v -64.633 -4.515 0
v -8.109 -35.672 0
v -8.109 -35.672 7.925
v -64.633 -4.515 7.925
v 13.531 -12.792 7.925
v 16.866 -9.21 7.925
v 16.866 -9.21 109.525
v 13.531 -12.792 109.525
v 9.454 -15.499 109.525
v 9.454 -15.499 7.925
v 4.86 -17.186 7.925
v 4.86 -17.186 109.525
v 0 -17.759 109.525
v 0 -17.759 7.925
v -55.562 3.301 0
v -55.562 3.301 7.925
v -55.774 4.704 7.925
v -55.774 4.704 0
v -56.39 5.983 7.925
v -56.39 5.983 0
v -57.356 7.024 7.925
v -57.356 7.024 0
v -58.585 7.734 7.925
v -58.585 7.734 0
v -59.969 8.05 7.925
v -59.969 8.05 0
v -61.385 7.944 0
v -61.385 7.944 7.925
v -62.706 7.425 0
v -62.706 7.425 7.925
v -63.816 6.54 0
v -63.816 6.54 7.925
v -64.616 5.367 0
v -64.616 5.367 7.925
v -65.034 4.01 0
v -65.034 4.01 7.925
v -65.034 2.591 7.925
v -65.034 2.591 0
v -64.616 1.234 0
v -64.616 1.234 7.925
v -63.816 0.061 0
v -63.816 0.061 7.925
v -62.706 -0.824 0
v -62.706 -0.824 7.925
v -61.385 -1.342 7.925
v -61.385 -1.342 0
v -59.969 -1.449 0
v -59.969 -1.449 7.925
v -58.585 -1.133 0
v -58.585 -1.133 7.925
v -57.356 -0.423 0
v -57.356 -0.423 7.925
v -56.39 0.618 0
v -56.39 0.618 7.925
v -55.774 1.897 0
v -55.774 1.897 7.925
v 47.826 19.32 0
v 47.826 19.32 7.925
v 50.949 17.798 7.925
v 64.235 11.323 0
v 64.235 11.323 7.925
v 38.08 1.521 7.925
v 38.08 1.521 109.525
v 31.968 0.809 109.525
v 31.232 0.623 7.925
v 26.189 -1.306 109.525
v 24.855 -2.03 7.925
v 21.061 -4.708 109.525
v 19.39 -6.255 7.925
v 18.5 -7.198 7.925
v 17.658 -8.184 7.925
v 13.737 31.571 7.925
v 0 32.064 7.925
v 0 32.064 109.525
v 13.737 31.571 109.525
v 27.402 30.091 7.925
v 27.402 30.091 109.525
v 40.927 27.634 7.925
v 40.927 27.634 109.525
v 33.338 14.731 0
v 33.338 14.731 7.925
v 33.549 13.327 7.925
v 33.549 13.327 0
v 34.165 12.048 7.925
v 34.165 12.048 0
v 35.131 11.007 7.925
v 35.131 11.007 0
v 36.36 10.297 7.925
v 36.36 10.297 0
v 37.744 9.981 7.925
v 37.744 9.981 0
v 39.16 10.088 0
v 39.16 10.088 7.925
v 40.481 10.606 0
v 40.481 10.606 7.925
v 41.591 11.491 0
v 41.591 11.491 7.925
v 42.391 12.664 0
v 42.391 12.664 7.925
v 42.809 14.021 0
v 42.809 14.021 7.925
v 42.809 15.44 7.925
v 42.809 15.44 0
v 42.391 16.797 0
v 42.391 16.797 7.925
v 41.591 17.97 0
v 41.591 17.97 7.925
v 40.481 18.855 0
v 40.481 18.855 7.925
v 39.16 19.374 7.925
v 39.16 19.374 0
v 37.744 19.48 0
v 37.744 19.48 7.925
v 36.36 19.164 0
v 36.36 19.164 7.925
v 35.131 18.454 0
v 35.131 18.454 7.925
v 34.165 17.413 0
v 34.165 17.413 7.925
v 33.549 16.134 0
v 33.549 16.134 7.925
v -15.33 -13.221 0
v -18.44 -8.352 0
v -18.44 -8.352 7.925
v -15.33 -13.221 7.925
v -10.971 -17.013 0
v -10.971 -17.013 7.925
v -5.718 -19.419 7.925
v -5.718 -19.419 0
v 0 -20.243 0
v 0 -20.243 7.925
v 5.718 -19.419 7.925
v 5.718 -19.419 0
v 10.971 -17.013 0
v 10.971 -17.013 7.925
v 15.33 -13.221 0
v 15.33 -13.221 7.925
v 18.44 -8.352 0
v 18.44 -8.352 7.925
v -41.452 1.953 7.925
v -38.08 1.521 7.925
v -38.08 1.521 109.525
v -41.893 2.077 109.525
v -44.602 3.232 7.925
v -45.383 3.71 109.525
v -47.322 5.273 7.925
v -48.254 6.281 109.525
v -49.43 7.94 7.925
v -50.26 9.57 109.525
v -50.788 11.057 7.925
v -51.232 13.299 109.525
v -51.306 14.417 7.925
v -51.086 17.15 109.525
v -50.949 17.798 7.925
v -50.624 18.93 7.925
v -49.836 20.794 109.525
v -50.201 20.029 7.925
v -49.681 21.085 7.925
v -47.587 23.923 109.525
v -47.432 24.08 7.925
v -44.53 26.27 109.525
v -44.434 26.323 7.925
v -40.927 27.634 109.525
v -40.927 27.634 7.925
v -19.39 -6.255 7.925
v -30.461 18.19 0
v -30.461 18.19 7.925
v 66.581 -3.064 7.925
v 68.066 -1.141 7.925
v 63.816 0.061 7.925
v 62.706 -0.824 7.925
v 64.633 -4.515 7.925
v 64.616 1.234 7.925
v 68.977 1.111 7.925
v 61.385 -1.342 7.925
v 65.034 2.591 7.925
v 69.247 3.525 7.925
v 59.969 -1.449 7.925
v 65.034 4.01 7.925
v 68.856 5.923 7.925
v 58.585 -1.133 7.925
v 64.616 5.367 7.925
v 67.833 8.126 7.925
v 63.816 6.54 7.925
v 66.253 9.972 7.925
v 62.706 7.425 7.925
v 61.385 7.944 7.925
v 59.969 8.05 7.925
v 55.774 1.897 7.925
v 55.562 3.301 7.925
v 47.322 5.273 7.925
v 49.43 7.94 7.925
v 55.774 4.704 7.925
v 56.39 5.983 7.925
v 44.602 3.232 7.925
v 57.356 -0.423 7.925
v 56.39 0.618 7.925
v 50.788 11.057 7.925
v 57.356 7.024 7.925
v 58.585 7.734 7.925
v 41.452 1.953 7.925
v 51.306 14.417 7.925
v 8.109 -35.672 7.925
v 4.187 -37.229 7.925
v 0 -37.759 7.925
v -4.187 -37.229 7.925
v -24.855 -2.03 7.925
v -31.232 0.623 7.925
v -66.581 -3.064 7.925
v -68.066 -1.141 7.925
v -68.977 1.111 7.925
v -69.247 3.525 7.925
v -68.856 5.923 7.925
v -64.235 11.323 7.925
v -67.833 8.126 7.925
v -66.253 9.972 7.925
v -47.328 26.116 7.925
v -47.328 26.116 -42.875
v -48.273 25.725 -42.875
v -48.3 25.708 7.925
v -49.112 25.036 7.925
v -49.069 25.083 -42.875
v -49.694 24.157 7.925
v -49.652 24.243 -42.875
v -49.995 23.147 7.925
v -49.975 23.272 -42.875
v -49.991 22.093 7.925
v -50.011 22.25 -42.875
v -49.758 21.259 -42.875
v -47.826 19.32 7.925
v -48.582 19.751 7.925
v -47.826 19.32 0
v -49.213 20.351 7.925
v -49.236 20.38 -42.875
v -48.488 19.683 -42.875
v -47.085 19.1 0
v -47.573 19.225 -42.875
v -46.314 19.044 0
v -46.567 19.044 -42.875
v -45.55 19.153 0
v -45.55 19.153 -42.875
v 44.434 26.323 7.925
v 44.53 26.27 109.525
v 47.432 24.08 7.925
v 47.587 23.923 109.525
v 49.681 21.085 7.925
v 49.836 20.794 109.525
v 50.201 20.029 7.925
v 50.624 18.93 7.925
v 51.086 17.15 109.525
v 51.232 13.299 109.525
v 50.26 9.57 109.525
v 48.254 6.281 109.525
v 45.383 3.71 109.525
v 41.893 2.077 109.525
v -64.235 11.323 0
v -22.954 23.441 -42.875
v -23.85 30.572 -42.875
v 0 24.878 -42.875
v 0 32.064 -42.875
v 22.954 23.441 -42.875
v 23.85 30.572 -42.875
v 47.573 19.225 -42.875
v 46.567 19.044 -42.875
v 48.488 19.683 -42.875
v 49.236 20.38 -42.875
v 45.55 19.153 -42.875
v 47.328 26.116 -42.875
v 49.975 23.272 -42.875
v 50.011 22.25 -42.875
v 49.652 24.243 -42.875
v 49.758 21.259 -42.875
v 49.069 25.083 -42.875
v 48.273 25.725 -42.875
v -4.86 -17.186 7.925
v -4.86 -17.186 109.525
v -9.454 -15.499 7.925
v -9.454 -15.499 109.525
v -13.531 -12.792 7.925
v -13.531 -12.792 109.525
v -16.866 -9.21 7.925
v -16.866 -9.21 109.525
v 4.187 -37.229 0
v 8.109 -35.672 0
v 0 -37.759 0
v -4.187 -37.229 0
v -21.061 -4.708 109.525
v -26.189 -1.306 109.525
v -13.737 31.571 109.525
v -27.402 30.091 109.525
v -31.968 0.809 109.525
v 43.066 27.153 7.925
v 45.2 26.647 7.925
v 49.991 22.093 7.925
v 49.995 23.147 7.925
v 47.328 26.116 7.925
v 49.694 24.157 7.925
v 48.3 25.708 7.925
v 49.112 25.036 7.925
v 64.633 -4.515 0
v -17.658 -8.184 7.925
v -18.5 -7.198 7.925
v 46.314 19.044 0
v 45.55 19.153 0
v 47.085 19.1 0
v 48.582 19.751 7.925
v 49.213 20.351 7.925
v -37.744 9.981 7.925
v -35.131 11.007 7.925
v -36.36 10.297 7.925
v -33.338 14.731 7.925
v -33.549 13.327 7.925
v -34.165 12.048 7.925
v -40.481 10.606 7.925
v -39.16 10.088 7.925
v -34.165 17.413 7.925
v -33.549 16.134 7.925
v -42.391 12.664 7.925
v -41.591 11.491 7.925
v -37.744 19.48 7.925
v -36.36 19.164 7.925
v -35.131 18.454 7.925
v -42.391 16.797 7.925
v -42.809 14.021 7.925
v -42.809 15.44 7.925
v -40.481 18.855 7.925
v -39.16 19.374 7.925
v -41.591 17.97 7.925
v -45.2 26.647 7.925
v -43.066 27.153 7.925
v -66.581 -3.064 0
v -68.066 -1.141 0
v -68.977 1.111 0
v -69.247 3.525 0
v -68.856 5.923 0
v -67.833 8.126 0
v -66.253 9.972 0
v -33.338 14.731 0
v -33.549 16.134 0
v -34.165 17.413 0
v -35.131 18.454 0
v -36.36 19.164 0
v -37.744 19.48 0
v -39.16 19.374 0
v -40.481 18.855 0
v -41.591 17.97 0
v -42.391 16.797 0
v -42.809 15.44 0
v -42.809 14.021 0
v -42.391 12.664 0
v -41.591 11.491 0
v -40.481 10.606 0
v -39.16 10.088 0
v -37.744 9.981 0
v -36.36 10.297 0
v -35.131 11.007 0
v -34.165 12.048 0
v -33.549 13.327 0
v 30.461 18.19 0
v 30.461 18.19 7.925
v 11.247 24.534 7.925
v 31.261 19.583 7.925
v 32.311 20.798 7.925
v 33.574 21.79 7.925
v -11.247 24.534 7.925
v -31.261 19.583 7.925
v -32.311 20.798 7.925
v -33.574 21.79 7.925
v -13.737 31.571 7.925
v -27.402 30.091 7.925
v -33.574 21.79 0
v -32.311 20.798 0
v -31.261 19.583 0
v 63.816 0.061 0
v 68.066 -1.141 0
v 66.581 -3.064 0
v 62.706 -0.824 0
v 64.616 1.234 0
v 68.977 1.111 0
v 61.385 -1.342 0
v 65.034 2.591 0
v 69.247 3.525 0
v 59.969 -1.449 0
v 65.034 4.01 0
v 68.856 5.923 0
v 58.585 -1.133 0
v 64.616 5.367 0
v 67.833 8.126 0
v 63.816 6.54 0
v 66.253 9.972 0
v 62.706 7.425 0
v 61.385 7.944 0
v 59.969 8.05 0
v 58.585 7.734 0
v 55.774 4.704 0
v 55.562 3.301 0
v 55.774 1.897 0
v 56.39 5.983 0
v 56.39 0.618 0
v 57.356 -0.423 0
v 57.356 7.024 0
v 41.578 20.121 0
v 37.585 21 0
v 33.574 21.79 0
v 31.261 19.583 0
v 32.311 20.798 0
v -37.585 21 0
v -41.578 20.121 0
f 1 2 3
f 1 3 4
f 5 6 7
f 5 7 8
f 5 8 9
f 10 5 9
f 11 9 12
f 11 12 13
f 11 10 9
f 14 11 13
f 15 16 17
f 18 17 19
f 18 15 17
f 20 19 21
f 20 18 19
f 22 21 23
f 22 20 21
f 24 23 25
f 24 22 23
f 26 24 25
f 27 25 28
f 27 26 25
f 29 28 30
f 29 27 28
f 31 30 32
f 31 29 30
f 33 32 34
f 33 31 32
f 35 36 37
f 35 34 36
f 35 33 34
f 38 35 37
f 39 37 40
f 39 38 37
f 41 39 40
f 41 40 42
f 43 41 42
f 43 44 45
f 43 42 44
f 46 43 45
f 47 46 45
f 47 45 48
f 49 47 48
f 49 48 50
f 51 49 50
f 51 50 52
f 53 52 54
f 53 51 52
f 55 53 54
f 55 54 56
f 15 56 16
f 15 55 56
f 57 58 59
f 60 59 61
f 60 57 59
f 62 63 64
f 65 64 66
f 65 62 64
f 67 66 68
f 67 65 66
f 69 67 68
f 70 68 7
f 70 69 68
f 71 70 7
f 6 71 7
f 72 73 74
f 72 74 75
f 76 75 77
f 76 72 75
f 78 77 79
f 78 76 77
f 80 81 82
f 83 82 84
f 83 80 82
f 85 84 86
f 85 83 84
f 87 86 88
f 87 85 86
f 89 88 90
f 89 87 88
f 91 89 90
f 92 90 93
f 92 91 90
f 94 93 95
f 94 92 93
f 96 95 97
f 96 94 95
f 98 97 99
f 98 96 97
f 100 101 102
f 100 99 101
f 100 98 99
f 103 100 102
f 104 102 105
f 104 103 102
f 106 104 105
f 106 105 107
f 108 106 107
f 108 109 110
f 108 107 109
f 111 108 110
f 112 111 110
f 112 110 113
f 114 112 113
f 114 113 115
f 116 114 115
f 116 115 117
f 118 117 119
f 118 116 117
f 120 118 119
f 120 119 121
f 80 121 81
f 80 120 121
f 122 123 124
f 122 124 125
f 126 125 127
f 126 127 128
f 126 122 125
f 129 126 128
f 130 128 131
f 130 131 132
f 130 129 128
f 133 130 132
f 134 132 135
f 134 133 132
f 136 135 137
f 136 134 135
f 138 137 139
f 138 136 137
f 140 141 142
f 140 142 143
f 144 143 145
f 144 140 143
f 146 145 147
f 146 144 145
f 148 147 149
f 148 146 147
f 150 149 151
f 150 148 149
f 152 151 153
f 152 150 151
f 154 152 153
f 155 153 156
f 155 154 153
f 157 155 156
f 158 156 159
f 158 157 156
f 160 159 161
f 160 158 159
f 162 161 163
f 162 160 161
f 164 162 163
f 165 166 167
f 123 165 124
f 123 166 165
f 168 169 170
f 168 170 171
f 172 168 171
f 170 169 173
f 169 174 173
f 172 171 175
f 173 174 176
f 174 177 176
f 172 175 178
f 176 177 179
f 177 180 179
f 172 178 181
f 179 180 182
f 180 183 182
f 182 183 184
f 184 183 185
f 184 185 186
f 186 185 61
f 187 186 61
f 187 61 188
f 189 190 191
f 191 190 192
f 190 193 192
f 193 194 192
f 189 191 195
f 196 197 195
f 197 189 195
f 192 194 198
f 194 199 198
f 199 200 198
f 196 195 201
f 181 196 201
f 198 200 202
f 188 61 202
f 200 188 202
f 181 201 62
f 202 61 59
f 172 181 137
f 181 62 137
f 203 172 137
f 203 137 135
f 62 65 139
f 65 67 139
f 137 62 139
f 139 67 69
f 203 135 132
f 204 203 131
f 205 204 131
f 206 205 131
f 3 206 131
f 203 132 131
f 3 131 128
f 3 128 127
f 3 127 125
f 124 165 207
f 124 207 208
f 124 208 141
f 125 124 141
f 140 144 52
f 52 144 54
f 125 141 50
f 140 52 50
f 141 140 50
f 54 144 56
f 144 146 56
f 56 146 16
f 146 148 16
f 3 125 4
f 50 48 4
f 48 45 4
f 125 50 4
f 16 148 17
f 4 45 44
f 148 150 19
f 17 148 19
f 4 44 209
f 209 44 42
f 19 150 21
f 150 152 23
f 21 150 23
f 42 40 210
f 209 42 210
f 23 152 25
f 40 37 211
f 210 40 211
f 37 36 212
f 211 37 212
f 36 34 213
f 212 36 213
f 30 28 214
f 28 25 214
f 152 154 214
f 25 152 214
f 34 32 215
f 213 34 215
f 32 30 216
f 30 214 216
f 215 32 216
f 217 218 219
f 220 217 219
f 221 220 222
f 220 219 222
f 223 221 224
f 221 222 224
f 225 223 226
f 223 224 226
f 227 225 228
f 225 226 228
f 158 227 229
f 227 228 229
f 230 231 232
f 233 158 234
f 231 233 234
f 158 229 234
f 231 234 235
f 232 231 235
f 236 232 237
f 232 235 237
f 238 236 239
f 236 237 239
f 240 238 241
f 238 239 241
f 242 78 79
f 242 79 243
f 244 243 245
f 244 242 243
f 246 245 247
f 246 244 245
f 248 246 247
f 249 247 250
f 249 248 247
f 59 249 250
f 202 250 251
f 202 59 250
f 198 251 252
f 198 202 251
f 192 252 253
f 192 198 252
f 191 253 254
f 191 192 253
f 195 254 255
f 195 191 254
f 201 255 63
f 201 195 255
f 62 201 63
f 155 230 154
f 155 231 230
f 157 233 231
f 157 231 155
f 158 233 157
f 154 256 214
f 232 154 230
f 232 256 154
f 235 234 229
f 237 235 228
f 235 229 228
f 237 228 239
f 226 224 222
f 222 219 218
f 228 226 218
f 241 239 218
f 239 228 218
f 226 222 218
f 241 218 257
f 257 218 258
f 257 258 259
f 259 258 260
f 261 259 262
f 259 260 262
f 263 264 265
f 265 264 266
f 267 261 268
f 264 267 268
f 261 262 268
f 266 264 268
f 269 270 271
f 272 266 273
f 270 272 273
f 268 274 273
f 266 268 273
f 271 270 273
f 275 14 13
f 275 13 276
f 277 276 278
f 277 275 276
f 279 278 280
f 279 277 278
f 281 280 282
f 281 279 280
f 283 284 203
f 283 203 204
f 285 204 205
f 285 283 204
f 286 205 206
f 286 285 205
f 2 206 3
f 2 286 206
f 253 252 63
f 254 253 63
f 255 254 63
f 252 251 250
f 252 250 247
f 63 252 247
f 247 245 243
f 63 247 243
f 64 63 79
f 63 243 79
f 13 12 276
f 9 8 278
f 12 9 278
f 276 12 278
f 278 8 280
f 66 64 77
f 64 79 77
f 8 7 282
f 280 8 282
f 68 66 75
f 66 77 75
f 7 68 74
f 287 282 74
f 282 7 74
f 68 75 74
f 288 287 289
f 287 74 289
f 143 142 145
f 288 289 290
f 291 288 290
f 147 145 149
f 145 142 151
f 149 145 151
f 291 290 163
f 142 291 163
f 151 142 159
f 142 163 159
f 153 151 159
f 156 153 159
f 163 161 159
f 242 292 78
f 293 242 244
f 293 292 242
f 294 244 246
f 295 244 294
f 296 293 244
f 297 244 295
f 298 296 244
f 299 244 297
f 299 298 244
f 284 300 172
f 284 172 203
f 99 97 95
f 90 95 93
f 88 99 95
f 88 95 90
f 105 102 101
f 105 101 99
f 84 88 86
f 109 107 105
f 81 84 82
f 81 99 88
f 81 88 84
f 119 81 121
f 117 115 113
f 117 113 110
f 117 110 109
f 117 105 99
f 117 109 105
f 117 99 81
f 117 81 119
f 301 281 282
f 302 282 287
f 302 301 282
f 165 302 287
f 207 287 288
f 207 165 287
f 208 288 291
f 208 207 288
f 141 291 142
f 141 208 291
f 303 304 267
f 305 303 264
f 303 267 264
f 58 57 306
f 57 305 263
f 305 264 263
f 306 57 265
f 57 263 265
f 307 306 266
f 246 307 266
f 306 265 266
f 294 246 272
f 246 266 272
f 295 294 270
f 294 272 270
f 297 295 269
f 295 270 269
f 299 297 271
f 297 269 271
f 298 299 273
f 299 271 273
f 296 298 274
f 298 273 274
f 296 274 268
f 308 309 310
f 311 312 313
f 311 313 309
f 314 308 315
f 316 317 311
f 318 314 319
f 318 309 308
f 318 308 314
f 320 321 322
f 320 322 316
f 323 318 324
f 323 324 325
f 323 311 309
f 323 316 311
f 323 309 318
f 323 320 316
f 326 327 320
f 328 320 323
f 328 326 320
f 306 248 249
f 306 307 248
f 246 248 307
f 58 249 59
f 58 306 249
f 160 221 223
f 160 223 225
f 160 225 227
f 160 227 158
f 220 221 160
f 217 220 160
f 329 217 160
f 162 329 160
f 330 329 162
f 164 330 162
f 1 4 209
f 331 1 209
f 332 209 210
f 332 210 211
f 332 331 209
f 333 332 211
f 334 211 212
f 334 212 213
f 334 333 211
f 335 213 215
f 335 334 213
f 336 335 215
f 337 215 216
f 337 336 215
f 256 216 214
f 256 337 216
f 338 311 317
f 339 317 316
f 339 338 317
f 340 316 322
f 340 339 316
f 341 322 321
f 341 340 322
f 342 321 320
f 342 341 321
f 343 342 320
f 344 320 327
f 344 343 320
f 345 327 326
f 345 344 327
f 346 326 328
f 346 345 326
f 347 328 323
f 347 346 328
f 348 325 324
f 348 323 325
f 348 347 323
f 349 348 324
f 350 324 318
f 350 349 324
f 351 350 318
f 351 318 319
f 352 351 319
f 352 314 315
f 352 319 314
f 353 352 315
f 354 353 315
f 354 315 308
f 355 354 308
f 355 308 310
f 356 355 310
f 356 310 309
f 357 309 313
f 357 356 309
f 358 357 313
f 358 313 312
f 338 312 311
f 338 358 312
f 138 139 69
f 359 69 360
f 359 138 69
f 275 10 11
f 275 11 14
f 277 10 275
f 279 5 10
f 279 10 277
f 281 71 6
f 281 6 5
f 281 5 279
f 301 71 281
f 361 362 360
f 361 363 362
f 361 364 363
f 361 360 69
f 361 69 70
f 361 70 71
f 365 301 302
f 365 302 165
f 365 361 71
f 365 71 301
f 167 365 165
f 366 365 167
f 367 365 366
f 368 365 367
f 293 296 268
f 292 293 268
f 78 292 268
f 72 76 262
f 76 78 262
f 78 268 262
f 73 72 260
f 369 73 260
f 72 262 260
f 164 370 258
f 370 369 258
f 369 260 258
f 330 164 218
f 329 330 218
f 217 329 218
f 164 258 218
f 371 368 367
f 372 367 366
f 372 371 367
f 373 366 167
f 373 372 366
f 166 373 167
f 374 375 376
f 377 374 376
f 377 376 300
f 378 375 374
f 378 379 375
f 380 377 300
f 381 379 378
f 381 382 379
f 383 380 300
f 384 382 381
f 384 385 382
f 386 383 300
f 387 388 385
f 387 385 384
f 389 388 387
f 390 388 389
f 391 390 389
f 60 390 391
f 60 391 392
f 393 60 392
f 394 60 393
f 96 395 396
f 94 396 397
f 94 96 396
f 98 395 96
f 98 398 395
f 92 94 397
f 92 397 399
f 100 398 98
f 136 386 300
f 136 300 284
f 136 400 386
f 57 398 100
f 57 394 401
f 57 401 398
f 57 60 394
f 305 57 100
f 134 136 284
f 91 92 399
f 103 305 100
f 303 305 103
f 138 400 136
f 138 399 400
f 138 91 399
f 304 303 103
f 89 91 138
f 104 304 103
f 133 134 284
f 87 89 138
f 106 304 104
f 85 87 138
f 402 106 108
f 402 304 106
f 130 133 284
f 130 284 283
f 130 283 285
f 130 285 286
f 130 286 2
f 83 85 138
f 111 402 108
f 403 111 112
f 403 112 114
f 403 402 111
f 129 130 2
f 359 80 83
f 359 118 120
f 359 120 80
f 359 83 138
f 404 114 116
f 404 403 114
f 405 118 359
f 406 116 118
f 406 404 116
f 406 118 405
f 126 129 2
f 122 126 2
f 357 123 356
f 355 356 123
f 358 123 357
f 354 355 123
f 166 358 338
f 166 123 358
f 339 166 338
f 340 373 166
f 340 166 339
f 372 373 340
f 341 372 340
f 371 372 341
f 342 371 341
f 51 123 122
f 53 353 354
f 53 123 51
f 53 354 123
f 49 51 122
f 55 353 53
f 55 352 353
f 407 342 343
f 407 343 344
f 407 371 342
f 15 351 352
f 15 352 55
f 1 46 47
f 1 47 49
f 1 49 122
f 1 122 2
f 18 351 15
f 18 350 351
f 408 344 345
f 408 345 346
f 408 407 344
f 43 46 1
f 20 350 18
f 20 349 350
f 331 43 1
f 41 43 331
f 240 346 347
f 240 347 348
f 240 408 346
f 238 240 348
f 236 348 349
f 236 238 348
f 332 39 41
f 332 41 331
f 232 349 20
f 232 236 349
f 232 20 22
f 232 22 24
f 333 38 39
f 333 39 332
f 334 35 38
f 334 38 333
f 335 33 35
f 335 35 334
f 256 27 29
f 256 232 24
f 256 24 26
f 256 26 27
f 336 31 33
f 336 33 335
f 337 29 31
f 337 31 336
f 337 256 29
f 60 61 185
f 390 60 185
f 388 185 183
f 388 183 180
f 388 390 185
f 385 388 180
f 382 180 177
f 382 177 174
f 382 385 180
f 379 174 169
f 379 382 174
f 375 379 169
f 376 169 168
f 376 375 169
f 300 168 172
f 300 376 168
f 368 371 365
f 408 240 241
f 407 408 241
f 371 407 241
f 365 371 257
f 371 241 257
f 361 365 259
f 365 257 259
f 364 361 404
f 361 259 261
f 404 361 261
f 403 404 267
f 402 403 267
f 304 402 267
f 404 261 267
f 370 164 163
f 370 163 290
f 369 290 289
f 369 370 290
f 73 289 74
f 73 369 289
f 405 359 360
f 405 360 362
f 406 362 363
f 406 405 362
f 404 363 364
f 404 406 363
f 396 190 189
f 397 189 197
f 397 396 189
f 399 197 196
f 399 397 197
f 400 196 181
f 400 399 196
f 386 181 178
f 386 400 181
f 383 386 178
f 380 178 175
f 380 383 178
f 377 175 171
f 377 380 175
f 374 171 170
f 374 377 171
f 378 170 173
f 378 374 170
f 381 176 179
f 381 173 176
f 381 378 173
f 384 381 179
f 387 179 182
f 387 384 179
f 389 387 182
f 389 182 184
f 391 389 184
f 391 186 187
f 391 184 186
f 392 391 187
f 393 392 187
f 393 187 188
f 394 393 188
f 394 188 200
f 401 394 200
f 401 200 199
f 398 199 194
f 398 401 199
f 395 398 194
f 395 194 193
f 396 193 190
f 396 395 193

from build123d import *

# Parameters (mm, degrees)
BOSS_EXTRUDE1_DEPTH = 7.9248
SKETCH1_R           = 15.113
SKETCH1_R_2         = 4.7625
CUT_EXTRUDE1_DEPTH  = 80.272040778
BOSS_EXTRUDE2_DEPTH = 101.6
BOSS_EXTRUDE3_START = 50.8
BOSS_EXTRUDE3_DEPTH = 50.8


with BuildPart() as part:
    # Sketch3 → Boss-Extrude1 (new body)
    with BuildSketch(Plane.XY):
        with BuildLine():
            Line((-64.234613185, 11.323473258), (-41.773518083, 22.268986661))
            ThreePointArc((-41.773518083, 22.268986661), (-35.255720627, 22.619332528), (-30.461132459, 18.190297621))
            Line((-30.461132459, 18.190297621), (-18.440189358, -8.351633097))
            ThreePointArc((-18.440189358, -8.351633097), (0, -20.243279352), (18.440189358, -8.351633097))
            Line((18.440189358, -8.351633097), (30.461132459, 18.190297621))
            ThreePointArc((30.461132459, 18.190297621), (35.255720627, 22.619332528), (41.773518083, 22.268986661))
            Line((41.773518083, 22.268986661), (64.234613185, 11.323473258))
            ThreePointArc((64.234613185, 11.323473258), (69.246925134, 3.525173307), (64.633248189, -4.515394972))
            Line((64.633248189, -4.515394972), (8.109165467, -35.67188883))
            ThreePointArc((8.109165467, -35.67188883), (0, -37.758787862), (-8.109165467, -35.67188883))
            Line((-8.109165467, -35.67188883), (-64.633248189, -4.515394972))
            ThreePointArc((-64.633248189, -4.515394972), (-69.246925134, 3.525173307), (-64.234613185, 11.323473258))
        make_face()
    extrude(amount=BOSS_EXTRUDE1_DEPTH)

    # Sketch1 → Cut-Extrude1 (cut, through all)
    with BuildSketch(Plane.XY):
        Circle(SKETCH1_R)
        with Locations((-60.325, 3.300624961)):
            Circle(SKETCH1_R_2)
        with Locations((-38.1, 14.730624961)):
            Circle(SKETCH1_R_2)
        with Locations(Location((38.1, 14.730624961, 0), (0, 0, 180))):
            Circle(SKETCH1_R_2)
        with Locations(Location((60.325, 3.300624961, 0), (0, 0, 180))):
            Circle(SKETCH1_R_2)
    extrude(amount=CUT_EXTRUDE1_DEPTH, mode=Mode.SUBTRACT)

    # Sketch4 → Boss-Extrude2 (add)
    with BuildSketch(Plane.XY.offset(7.9248)):
        with BuildLine():
            ThreePointArc((-40.926635767, 27.63434288), (-20.582852086, 30.953683993), (0, 32.064431449))
            ThreePointArc((0, 32.064431449), (20.582852086, 30.953683993), (40.926635767, 27.63434288))
            ThreePointArc((40.926635767, 27.63434288), (51.23189196, 13.299115463), (38.080011359, 1.520954021))
            ThreePointArc((38.080011359, 1.520954021), (26.188891906, -1.306064402), (16.866232202, -9.210415804))
            ThreePointArc((16.866232202, -9.210415804), (9.454365502, -15.499494869), (0, -17.758533696))
            ThreePointArc((0, -17.758533696), (-9.454365502, -15.499494869), (-16.866232202, -9.210415804))
            ThreePointArc((-16.866232202, -9.210415804), (-26.188891906, -1.306064402), (-38.080011359, 1.520954021))
            ThreePointArc((-38.080011359, 1.520954021), (-51.23189196, 13.299115463), (-40.926635767, 27.63434288))
        make_face()
    extrude(amount=BOSS_EXTRUDE2_DEPTH)

    # Sketch5 → Boss-Extrude3 (add)
    with BuildSketch(Plane(origin=(0, 0, 7.9248), x_dir=(-1, 0, 0), z_dir=(0, 0, -1)).offset(BOSS_EXTRUDE3_START)):
        with BuildLine():
            ThreePointArc((-47.327995259, 26.116255836), (0, 32.064431449), (47.327995259, 26.116255836))
            ThreePointArc((47.327995259, 26.116255836), (49.920381816, 21.745535091), (45.549661071, 19.153148533))
            ThreePointArc((45.549661071, 19.153148533), (0, 24.877823363), (-45.549661071, 19.153148533))
            ThreePointArc((-45.549661071, 19.153148533), (-49.920381816, 21.745535091), (-47.327995259, 26.116255836))
        make_face()
    extrude(amount=-BOSS_EXTRUDE3_DEPTH)


solid = part.part
